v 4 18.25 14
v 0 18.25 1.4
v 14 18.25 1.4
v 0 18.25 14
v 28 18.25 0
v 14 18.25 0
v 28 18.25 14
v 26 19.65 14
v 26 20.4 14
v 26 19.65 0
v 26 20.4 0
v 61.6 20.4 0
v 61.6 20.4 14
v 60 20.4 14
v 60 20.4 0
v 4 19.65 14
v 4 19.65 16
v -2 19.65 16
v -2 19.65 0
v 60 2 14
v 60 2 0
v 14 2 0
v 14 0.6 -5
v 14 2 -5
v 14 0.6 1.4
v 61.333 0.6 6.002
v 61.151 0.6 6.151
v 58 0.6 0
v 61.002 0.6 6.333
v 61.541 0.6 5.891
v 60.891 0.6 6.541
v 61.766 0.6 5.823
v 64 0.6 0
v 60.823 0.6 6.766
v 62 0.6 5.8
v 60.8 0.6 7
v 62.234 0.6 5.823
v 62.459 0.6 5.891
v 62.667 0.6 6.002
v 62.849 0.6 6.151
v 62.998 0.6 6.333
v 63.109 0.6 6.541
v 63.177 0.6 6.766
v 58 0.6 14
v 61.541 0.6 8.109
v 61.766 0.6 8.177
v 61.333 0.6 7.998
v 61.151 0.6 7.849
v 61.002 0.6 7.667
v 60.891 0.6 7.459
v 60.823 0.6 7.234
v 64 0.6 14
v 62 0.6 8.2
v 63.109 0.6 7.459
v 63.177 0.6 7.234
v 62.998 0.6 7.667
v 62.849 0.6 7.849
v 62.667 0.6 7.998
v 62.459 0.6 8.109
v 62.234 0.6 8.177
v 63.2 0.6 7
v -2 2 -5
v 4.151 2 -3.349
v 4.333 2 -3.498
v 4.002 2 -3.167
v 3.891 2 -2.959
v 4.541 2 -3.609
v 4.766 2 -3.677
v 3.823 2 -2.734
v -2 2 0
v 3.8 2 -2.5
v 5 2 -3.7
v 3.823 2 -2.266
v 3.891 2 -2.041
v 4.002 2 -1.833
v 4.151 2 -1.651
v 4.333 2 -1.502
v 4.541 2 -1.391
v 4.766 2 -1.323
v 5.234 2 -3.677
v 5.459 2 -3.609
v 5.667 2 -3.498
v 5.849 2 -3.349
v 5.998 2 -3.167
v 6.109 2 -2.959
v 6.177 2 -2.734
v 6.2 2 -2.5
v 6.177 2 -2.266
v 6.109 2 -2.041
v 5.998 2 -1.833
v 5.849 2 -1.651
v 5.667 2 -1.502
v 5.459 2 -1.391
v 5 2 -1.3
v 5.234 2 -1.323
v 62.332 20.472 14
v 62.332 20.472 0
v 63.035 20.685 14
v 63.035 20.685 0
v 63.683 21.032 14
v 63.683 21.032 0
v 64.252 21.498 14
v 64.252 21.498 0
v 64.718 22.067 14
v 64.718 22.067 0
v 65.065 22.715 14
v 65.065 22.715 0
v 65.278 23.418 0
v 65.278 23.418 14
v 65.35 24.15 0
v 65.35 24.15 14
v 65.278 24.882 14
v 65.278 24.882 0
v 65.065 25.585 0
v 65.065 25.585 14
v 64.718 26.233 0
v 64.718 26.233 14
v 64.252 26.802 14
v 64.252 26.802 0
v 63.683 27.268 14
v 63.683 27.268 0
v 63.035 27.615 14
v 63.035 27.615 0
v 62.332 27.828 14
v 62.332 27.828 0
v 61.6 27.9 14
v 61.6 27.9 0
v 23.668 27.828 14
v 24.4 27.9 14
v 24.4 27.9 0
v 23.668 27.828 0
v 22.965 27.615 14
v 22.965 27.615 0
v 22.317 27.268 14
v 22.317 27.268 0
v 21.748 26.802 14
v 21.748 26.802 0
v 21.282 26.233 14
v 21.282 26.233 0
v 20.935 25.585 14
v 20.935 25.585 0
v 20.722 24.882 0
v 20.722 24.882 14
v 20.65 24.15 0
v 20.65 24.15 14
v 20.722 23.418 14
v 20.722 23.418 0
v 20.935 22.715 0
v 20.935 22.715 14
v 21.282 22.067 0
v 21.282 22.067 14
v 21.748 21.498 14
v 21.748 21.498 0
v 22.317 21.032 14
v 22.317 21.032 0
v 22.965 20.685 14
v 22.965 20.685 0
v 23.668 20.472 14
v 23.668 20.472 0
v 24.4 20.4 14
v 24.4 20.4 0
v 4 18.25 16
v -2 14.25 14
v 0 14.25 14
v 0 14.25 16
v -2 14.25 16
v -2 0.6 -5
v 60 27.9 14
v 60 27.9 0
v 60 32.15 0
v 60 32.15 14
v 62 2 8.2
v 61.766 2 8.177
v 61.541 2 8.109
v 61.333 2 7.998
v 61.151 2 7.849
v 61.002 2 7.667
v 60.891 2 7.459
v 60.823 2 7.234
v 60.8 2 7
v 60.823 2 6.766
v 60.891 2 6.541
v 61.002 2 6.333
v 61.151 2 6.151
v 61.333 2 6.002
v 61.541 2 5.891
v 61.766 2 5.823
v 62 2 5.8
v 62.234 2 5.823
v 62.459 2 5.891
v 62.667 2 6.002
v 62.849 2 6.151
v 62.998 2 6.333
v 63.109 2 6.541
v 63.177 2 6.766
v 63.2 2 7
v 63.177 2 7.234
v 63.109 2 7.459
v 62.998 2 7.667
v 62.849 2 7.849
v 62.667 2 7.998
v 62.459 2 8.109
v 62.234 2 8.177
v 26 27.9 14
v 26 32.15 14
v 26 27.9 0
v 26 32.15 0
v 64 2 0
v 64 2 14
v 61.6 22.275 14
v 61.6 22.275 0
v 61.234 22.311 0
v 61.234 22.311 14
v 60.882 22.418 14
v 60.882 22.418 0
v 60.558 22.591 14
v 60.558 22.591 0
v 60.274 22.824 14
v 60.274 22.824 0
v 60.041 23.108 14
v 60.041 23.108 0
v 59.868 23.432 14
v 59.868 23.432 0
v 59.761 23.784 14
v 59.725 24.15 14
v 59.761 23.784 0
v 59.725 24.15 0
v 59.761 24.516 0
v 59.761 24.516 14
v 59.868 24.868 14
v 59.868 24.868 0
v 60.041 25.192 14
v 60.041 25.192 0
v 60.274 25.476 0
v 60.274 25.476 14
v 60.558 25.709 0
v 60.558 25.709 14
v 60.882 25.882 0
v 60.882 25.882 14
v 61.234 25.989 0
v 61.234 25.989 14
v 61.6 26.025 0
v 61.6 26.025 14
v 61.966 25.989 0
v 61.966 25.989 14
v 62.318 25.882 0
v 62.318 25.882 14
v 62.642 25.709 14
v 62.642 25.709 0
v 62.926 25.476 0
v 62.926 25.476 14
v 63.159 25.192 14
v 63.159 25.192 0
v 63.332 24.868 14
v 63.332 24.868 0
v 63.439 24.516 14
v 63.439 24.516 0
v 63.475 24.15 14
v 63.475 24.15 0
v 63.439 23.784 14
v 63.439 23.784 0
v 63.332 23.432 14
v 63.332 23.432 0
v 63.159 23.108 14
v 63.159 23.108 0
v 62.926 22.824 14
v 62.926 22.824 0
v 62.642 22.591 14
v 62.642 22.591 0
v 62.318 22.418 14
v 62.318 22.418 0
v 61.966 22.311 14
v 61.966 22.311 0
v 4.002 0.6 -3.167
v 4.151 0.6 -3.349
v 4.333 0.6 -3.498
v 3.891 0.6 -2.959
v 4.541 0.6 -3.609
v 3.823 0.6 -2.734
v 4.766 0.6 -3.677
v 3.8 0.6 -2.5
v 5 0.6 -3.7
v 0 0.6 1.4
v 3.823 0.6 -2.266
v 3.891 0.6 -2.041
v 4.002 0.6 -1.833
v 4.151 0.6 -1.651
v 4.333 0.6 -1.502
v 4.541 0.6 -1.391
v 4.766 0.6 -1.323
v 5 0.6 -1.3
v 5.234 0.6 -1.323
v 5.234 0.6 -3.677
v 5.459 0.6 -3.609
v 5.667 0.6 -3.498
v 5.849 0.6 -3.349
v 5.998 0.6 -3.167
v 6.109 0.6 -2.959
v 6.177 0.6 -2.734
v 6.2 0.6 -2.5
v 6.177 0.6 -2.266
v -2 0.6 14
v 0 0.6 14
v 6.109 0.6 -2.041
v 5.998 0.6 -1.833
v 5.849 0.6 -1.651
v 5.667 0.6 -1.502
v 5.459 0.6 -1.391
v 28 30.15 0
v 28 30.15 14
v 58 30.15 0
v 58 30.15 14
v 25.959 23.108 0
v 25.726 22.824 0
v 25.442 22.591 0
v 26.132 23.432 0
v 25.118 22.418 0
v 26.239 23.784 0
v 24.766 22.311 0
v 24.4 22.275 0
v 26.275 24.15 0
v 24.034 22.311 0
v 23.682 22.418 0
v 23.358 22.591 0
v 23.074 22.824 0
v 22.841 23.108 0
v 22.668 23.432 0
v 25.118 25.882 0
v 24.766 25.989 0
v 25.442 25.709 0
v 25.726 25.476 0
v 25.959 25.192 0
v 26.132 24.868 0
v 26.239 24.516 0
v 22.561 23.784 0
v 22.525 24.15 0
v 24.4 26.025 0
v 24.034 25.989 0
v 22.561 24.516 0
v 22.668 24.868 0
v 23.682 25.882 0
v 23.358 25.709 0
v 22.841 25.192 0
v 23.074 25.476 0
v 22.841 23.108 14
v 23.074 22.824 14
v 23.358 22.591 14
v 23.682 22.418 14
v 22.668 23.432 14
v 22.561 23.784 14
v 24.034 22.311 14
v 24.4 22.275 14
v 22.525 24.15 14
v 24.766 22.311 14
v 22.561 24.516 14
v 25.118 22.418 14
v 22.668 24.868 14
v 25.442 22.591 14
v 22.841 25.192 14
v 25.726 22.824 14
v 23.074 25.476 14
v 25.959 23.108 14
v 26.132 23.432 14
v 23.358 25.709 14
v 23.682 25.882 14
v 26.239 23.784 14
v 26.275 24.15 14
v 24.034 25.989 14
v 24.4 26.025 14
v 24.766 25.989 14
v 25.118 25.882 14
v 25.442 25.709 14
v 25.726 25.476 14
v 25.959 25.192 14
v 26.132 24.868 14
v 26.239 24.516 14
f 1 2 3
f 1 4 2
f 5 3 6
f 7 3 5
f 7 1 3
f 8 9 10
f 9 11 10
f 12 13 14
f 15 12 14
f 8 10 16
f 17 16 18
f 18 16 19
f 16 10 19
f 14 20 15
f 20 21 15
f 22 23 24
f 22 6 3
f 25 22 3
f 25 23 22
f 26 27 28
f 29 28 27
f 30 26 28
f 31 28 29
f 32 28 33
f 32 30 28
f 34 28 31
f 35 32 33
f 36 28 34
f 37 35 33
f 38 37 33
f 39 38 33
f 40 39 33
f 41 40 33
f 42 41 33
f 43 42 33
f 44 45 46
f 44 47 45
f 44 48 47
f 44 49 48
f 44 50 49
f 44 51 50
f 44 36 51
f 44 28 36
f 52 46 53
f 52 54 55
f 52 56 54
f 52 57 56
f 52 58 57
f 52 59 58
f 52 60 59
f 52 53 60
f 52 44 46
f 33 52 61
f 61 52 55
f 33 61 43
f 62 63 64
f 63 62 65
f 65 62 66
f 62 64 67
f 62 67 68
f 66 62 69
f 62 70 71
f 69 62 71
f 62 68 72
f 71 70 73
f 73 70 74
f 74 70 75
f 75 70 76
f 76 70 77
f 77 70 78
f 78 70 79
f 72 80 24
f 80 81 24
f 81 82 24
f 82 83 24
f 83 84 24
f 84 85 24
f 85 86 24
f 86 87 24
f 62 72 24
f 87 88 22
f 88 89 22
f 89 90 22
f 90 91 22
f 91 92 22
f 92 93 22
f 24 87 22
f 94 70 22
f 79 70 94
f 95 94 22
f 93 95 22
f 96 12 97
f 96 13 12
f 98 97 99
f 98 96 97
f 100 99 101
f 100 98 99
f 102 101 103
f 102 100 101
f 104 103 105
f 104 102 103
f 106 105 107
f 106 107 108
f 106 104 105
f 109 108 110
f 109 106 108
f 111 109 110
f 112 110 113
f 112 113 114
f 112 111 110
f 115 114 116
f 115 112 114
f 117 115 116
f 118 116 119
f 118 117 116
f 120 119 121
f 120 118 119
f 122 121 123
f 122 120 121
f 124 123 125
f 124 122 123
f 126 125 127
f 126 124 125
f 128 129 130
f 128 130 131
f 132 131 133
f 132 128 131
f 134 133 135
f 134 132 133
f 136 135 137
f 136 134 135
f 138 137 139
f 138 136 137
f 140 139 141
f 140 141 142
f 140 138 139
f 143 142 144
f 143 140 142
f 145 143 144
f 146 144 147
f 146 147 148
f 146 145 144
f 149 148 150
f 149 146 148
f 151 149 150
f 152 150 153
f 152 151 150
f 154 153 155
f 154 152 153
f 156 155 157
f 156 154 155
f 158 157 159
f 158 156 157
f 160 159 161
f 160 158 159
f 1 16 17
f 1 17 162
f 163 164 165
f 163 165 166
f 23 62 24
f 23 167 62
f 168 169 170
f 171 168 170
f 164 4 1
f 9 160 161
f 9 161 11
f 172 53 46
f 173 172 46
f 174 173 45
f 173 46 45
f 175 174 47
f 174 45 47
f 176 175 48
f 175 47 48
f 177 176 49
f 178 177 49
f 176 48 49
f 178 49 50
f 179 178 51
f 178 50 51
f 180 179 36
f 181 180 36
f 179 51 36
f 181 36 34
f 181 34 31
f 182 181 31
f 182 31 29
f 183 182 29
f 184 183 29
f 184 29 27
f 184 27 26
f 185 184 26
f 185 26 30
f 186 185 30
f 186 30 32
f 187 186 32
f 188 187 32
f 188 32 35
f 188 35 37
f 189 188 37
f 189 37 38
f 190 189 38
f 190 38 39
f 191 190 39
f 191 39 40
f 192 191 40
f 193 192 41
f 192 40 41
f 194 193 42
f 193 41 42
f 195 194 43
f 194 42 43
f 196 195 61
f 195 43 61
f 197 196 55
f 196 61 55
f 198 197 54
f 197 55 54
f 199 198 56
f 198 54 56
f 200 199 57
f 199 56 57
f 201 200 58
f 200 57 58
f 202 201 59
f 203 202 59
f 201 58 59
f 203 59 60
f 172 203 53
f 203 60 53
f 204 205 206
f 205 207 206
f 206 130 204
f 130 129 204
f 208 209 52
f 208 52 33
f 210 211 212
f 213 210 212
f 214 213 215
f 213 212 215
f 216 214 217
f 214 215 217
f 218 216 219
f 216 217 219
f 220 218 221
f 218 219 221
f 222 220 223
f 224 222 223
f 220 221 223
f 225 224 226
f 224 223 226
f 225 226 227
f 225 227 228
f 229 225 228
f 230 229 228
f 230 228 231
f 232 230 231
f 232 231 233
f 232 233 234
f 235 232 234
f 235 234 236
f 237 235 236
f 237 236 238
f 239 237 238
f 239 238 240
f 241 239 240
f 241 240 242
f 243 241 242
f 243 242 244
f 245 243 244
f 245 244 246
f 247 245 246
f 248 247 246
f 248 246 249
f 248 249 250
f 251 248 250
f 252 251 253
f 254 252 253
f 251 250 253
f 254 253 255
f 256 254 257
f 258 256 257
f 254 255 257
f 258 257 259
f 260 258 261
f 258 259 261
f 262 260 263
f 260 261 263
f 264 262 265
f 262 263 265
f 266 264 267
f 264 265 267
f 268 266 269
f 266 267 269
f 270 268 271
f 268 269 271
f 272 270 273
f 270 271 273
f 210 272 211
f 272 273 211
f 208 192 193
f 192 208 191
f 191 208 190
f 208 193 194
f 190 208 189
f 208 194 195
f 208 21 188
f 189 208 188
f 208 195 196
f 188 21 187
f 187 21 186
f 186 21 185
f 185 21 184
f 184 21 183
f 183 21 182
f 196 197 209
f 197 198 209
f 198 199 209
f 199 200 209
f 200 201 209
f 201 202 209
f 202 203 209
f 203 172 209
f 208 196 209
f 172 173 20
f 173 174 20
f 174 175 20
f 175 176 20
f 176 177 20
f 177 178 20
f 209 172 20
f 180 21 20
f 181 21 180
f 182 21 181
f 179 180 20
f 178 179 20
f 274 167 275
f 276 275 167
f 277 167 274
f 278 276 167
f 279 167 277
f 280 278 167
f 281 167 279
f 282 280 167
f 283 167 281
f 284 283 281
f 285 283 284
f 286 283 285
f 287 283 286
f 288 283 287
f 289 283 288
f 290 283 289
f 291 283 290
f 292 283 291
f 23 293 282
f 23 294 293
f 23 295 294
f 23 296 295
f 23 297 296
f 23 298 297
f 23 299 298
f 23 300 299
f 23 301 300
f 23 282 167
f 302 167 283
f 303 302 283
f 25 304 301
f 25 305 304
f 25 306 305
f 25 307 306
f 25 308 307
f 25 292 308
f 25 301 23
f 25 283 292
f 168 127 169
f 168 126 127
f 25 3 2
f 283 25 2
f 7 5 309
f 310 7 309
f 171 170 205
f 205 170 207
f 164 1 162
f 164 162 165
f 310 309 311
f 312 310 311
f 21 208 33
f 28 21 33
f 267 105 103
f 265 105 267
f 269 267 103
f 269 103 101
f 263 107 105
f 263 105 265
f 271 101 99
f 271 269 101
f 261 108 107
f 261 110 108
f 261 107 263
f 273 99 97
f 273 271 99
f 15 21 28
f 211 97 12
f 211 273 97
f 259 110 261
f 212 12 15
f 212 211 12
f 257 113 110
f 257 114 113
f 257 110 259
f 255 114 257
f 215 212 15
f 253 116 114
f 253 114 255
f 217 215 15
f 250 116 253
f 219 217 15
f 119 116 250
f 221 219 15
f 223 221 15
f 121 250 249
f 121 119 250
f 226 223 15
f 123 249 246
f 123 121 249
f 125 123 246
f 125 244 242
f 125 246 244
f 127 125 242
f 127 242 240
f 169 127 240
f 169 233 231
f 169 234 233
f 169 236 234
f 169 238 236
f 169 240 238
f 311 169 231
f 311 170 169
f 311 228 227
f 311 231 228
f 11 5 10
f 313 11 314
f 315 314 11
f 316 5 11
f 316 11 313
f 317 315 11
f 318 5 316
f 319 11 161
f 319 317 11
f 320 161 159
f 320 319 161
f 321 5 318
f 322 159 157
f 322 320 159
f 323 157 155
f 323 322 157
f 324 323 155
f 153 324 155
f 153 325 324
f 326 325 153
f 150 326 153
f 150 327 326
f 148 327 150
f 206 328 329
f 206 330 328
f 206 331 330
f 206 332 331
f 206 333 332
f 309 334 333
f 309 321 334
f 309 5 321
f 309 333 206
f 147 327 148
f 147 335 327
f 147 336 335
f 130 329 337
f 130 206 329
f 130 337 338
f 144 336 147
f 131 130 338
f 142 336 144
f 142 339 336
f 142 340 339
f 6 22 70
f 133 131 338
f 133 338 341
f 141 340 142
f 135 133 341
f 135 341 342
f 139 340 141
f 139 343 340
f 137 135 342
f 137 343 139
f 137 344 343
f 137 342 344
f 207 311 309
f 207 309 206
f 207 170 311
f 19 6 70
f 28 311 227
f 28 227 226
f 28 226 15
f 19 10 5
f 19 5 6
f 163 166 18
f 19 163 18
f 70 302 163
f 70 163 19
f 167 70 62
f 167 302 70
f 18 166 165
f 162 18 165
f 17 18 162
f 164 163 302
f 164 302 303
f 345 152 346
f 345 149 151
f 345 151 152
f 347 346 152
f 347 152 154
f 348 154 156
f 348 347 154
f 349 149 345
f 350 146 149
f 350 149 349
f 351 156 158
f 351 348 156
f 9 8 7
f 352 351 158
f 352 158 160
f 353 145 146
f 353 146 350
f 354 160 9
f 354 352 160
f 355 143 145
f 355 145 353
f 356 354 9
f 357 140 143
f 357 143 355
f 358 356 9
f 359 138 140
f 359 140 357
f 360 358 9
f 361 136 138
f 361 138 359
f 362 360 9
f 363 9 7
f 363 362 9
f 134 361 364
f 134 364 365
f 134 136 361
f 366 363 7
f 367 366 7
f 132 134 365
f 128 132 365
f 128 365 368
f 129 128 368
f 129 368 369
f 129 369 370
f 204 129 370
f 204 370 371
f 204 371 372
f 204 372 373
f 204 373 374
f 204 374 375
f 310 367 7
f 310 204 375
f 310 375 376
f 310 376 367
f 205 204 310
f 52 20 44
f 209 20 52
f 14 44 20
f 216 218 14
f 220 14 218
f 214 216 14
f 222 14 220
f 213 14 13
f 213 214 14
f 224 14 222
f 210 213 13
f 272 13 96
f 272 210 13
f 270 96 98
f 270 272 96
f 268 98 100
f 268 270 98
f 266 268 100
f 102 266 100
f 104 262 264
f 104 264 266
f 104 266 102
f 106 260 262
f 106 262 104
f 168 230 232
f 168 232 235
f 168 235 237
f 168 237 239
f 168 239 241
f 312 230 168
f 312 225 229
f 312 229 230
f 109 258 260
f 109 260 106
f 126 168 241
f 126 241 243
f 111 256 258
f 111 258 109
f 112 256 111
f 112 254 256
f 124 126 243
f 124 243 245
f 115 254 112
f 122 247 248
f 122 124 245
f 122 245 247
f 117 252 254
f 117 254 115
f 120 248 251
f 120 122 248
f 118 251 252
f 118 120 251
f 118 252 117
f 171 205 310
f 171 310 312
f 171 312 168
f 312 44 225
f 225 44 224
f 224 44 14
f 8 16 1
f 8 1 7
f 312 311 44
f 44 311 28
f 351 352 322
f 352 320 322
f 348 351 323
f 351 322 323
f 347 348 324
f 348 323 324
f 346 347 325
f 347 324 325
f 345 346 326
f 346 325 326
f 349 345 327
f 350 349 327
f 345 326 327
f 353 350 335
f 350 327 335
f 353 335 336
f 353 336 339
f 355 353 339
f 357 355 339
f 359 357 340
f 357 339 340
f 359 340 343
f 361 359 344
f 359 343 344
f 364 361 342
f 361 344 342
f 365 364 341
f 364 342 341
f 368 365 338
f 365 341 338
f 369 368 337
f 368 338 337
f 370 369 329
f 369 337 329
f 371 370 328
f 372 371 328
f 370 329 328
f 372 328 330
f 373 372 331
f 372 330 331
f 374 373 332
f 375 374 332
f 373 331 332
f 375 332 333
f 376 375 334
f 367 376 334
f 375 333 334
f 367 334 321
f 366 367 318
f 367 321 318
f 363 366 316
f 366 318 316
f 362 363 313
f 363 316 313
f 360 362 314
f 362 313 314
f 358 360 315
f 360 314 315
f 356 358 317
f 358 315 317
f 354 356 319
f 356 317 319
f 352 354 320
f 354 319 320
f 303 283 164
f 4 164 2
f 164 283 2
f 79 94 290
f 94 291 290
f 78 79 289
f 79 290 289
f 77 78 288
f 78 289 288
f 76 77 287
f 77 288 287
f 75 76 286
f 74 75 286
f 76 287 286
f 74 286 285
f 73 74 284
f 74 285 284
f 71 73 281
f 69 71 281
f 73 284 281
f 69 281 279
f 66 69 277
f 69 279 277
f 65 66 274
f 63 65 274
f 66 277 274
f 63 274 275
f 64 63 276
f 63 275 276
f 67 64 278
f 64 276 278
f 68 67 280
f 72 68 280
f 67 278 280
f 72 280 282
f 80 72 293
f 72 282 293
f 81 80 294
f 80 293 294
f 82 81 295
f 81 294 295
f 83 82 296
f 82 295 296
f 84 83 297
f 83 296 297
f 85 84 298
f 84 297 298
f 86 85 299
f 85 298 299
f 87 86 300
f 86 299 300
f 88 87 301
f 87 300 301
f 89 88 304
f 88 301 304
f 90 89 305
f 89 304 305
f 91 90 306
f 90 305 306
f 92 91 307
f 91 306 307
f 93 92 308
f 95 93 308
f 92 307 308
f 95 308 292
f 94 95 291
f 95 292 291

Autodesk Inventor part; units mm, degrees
ref_plane "YZ Plane" through (0, 0, 0) normal (1, 0, 0) x (0, 1, 0)
ref_plane "XZ Plane" through (0, 0, 0) normal (0, 1, 0) x (-1, 0, 0)
ref_plane "XY Plane" through (0, 0, 0) normal (0, 0, 1) x (1, 0, 0)
sketch "スケッチ1" plane through (0, 0, 0) normal (0, 0, 1) x (1, 0, 0)
  line L0 (0, 0) -> (0, 17.65)
  line L1 (0, 17.65) -> (28, 17.65)
  line L2 (28, 17.65) -> (28, 30.15)
  line L3 (28, 30.15) -> (58, 30.15)
  line L4 (58, 30.15) -> (58, 0)
  line L5 (58, 0) -> (60, 0)
  line L6 (60, 0) -> (60, 32.15)
  line L7 (60, 32.15) -> (28, 32.15)
  line L8 (28, 32.15) -> (26, 32.15)
  line L9 (26, 32.15) -> (26, 19.65)
  line L10 (26, 19.65) -> (-2, 19.65)
  line L11 (-2, 19.65) -> (-2, 0)
  line L12 (-2, 0) -> (0, 0)
  dimension "d0" = 17.65
  dimension "d1" = 28
  dimension "d2" = 12.5
  dimension "d3" = 30
  dimension "d4" = 2
  dimension "d5" = 32.15
  dimension "d6" = 32
  dimension "d7" = 2
  dimension "d8" = 12.5
  dimension "d9" = 28
extrude "押し出し1" add sketch "スケッチ1" along normal blind 14
sketch "スケッチ2" plane through (60, 0, 0) normal (1, 0, 0) x (0, 0, -1)
  line L0 (0, 0) -> (-14, 0) projected
  line L1 (-14, 0) -> (0, 0)
  line L2 (0, 0) -> (0, 2)
  line L3 (0, 2) -> (-14, 2)
  line L4 (-14, 2) -> (-14, 0)
  dimension "d12" = 14
  dimension "d13" = 2
extrude "押し出し2" add sketch "スケッチ2" along normal blind 7
sketch "スケッチ4" plane through (0, 0, 14) normal (0, 0, 1) x (1, 0, 0)
  line L0 (60, 32.15) -> (60, 24.15)
  line L1 (60, 24.15) -> (61.6, 24.15)
  arc A0 (61.6, 20.4) -> (61.6, 27.9) centre (61.6, 24.15) ccw
  line L2 (61.6, 24.15) -> (61.6, 20.4) construction
  line L3 (61.6, 24.15) -> (61.6, 27.9) construction
  line L4 (61.6, 27.9) -> (60, 27.9)
  line L5 (61.6, 20.4) -> (60, 20.4)
  line L6 (60, 2) -> (60, 32.15) projected
  line L7 (60, 27.9) -> (60, 20.4)
  point P0 (0, 0)
  dimension "d47" = 8
  dimension "d48" = 1.6
  dimension "d49" = 3.75
  dimension "d50" = 180
extrude "押し出し4" add sketch "スケッチ4" against normal blind 14
hole "穴3" at (61.6, 24.15, 14) direction (0, 0, -1) diameter 3.75 end through all
sketch "スケッチ7" plane through (0, 0, 14) normal (0, 0, 1) x (1, 0, 0)
  line L0 (60, 32.15) -> (26, 32.15) projected
  line L1 (26, 32.15) -> (26, 24.15)
  line L2 (26, 24.15) -> (24.4, 24.15)
  arc A0 (24.4, 27.9) -> (24.4, 20.4) centre (24.4, 24.15) ccw
  line L3 (24.4, 27.9) -> (26, 27.9)
  line L4 (24.4, 20.4) -> (26, 20.4)
  line L5 (26, 20.4) -> (26, 27.9)
  line L6 (26, 32.15) -> (26, 19.65) projected
  circle A1 centre (24.4, 24.15) radius 1.875
  point P0 (0, 0)
  dimension "d60" = 8
  dimension "d61" = 1.6
  dimension "d62" = 3.75
  dimension "d63" = 3.75
extrude "押し出し6" add sketch "スケッチ7" against normal blind 14 contours L1 A1 L5 L4 A0 L3 | L1 L5 A1 picked at (23.6929, 24.15)
hole "穴4" at (24.4, 24.15, 14) direction (0, 0, -1) diameter 3.75 end through all
sketch "スケッチ10" plane through (0, 17.65, 0) normal (0, -1, 0) x (1, 0, 0)
  line L0 (28, 14) -> (58, 14) projected
  line L1 (0, 0) -> (28, 0)
  line L2 (28, 0) -> (28, 14)
  line L3 (28, 14) -> (0, 14)
  line L4 (0, 14) -> (0, 0)
extrude "押し出し7" cut sketch "スケッチ10" against normal blind 0.6
sketch "スケッチ11" plane through (0, 0, 0) normal (0, -1, 0) x (1, 0, 0)
  line L0 (-2, 14) -> (0, 14) projected
  line L1 (60, 0) -> (67, 0) projected
  line L2 (-9, 14) -> (67, 14)
  line L3 (67, 14) -> (67, 0)
  line L4 (67, 0) -> (-9, 0)
  line L5 (-9, 0) -> (-9, 14)
  point P0 (0, 0)
extrude "押し出し8" cut sketch "スケッチ11" against normal blind 0.6
sketch "スケッチ12" plane through (0, 0, 14) normal (0, 0, 1) x (1, 0, 0)
  line L0 (-2, 19.65) -> (-2, 0.6) projected
  line L1 (-2, 19.65) -> (4, 19.65)
  line L2 (26, 19.65) -> (-2, 19.65) projected
  line L3 (4, 19.65) -> (4, 18.25)
  line L4 (0, 18.25) -> (28, 18.25) projected
  line L5 (4, 18.25) -> (0.2844, 14.5344)
  line L6 (4, 18.25) -> (9.2547, 18.25) construction
  line L7 (0.2844, 14.5344) -> (0, 14.25)
  line L8 (0, 0.6) -> (0, 18.25) projected
  line L9 (0, 14.25) -> (-2, 14.25)
  line L10 (-2, 14.25) -> (-2, 19.65)
  point P0 (0, 0)
  point P1 (-2, 2)
  dimension "d79" = 6
  dimension "d80" = 135
extrude "押し出し9" add sketch "スケッチ12" along normal blind 2
sketch "スケッチ15" plane through (0, 0, 0) normal (0, 0, -1) x (-1, 0, 0)
  line L0 (0, 0.6) -> (0, 18.25) projected
  line L1 (0, 18.25) -> (-14, 18.25)
  line L2 (-14, 18.25) -> (-14, 0.6)
  line L3 (-14, 0.6) -> (0, 0.6)
  line L4 (0, 0.6) -> (0, 18.25)
  point P0 (0, 0)
  dimension "d88" = 14
extrude "押し出し11" add sketch "スケッチ15" against normal blind 1.4
sketch "スケッチ17" plane through (67, 0, 0) normal (1, 0, 0) x (0, 0, -1)
  line L0 (0, 0.6) -> (-14, 0.6) projected
  line L1 (0, 0.6) -> (-14, 0.6)
  line L2 (-14, 0.6) -> (-14, 9.5309)
  line L3 (-14, 9.5309) -> (0, 9.5309)
  line L4 (0, 9.5309) -> (0, 0.6)
  point P0 (0, 0)
extrude "押し出し13" cut sketch "スケッチ17" against normal blind 3
ref_plane "作業平面1" through (-9, 0, 0) normal (-1, 0, 0) x (0, 0, 1)
sketch "スケッチ18" plane through (-9, 0, 0) normal (-1, 0, 0) x (0, 0, 1)
  line L0 (0, 0.6) -> (14, 0.6) projected
  line L1 (0, 0.6) -> (14, 0.6)
  line L2 (14, 0.6) -> (14, 6.5)
  line L3 (14, 6.5) -> (0, 6.5)
  line L4 (0, 6.5) -> (0, 0.6)
  point P0 (0, 0)
extrude "押し出し14" cut sketch "スケッチ18" against normal blind 3
hole "穴6" at (62, 2, 7) direction (0, -1, 0) diameter 2.4 end through all
sketch "スケッチ19" plane through (0, 0.6, 0) normal (0, -1, 0) x (1, 0, 0)
  line L0 (14, 1.4) -> (14, 0) projected
  line L1 (14, 0) -> (-2, 0)
  line L2 (-2, 0) -> (-2, -5)
  line L3 (-2, -5) -> (14, -5)
  line L4 (14, -5) -> (14, 0)
  point P0 (0, 0)
  dimension "d115" = 5
extrude "押し出し15" add sketch "スケッチ19" against normal blind 1.4
hole "穴7" at (5, 2, -2.5) direction (0, -1, 0) diameter 2.4 end through all
properties part number "センサ冶具2個積み左"
